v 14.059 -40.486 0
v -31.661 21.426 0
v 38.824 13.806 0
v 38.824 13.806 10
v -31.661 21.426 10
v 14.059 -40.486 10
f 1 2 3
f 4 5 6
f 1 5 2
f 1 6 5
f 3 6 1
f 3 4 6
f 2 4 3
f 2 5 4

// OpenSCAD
linear_extrude(height=10)
hull()
scale(0.5)
translate([-150, +80])
polygon(
    points=[
    [86.6775, -37.1475],
    [178.1175, -160.9725],
    [227.6475, -52.3875],
    ]
);
